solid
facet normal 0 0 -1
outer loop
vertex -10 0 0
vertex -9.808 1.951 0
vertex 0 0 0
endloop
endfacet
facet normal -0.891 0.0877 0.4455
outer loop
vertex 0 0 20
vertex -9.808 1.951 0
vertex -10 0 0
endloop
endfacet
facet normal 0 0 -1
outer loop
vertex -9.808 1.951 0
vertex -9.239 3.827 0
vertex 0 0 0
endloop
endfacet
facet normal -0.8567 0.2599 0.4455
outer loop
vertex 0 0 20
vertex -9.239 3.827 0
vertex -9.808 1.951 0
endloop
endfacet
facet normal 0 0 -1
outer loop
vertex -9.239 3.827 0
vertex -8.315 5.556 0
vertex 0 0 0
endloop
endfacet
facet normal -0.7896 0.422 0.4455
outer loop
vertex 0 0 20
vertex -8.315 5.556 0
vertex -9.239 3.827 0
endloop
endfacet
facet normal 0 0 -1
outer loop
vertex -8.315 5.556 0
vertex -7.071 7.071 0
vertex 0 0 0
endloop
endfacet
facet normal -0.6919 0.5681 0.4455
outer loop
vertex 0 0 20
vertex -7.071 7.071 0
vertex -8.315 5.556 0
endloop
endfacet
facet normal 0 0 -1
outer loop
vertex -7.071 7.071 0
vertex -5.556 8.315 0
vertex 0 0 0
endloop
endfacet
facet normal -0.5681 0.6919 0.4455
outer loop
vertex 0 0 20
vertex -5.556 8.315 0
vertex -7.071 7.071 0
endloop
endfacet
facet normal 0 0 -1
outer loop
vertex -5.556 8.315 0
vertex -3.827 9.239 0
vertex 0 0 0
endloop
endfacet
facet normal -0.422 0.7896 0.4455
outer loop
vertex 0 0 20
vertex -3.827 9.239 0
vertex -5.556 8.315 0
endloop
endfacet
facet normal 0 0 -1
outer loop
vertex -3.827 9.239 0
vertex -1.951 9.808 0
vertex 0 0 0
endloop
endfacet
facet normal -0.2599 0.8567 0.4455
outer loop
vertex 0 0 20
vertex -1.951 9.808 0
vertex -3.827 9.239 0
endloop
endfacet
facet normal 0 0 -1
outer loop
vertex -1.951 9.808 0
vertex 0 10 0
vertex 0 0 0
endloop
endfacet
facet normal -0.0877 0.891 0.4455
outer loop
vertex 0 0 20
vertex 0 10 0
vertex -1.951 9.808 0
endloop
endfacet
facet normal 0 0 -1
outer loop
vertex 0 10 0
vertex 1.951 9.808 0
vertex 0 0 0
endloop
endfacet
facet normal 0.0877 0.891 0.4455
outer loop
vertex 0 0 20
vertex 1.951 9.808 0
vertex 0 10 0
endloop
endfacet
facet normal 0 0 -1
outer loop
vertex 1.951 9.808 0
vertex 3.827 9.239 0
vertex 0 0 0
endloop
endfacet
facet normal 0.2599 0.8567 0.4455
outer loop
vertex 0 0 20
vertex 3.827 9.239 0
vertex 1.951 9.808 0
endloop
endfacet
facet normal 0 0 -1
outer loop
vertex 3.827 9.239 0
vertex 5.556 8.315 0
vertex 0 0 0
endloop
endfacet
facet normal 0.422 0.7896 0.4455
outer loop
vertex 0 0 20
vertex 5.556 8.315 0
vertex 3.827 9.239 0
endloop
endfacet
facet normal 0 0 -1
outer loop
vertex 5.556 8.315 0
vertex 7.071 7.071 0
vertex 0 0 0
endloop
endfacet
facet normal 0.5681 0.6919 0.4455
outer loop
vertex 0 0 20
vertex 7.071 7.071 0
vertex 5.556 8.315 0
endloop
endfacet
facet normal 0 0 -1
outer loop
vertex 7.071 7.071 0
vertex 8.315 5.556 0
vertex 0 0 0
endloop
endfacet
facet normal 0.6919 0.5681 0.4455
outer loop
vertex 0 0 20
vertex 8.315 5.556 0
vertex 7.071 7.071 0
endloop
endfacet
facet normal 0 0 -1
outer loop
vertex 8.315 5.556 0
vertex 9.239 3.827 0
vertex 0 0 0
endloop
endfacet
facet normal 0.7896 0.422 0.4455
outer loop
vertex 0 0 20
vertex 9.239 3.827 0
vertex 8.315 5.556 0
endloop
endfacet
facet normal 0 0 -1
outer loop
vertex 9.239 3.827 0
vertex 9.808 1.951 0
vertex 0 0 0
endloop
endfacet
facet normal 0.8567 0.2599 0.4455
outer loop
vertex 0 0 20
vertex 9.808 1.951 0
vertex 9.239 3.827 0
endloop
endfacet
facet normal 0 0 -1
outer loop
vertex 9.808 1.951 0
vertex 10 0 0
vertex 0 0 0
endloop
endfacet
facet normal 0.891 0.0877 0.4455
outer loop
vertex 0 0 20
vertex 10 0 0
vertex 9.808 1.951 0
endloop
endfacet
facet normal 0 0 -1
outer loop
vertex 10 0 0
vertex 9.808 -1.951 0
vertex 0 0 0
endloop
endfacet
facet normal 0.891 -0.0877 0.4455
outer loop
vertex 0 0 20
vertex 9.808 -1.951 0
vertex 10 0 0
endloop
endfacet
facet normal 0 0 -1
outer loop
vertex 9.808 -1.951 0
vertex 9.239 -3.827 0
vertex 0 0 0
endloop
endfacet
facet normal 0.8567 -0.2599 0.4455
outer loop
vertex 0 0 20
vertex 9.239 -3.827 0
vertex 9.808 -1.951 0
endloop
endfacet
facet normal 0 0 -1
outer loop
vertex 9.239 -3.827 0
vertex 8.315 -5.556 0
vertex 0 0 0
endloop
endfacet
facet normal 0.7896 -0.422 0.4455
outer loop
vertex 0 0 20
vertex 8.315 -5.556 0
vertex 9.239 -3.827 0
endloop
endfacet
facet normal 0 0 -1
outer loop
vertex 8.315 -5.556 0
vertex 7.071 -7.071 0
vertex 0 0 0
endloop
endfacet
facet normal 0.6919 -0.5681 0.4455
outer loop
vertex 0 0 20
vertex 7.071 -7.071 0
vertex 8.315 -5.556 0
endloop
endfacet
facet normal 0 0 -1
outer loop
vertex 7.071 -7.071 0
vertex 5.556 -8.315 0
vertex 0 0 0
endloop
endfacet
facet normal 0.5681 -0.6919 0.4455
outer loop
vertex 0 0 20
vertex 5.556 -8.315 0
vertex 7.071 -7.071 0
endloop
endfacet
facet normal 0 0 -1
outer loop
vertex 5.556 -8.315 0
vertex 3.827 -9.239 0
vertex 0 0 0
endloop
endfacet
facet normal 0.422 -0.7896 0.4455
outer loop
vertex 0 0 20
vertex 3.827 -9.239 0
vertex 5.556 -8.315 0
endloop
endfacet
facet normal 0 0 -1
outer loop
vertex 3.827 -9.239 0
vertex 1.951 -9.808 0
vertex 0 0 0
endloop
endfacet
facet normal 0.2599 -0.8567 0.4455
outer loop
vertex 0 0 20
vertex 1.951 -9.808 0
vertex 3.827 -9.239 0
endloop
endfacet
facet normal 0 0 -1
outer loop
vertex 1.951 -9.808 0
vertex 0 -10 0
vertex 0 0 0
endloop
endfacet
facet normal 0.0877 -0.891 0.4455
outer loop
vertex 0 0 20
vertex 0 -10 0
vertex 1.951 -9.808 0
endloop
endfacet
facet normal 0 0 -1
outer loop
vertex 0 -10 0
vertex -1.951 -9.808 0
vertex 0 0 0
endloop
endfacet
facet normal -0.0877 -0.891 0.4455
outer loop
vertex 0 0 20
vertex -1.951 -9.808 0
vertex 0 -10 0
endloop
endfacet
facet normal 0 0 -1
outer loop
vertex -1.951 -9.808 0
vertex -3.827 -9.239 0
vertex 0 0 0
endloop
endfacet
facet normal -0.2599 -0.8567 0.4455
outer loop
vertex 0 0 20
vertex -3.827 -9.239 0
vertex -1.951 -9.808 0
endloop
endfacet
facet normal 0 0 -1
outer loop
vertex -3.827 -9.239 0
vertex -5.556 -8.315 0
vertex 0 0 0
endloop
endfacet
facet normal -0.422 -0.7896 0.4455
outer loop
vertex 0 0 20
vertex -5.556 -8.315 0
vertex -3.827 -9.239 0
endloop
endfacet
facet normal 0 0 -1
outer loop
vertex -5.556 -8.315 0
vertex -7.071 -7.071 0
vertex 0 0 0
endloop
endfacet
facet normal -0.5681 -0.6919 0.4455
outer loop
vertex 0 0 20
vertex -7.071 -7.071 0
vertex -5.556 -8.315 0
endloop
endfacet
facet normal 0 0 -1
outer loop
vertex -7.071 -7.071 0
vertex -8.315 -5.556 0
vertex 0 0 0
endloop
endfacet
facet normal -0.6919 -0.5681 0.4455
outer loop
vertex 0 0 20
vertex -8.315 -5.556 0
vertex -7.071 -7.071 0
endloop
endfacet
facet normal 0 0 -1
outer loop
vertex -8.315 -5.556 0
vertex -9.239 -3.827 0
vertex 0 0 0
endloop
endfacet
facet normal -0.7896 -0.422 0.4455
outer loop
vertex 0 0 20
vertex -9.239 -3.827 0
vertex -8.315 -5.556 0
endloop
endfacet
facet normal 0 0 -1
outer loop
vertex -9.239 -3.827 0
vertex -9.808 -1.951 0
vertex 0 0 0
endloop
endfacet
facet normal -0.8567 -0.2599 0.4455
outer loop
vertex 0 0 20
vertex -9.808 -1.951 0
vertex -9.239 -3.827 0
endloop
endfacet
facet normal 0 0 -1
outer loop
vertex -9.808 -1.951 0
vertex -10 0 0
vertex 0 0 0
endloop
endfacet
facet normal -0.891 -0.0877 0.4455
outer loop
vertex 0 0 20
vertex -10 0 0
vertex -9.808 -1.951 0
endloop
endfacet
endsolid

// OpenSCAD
// A profile with a point on the axis, which is where rotate_extrude used to
// leave degenerate facets behind.
//
// Every revolved profile point becomes one vertex per angular step. A point on
// the axis is the exception: all of its copies are the same point in space, and
// emitting them separately gives each ring of the fan a triangle with two
// coincident corners - zero area, no normal, and a shell that is closed only in
// the sense that its holes are infinitely thin. Nothing downstream can fit a
// surface through that, so a turned cone would export as one plane per facet
// plus the slivers between them. The generator welds them instead.
//
// The regression this guards is not subtle once it is measured: on a profile
// like a wine glass's the same defect took the export from 42 faces to 2616.
//
// And since 2026-09-25 the cone is declared. A segment reaching the axis sweeps
// a cone whose apex is on it - a wall like any other - and rotate_extrude
// refused it, first because the fan left the shell open and then because
// nobody took the refusal out once the weld had closed it (doc/step-export-wip.md,
// *Inferred where a declaration was possible*, item 4). The sweep table declares
// it now as it declares every sloped edge's cone: a face, anchored at its one
// rim, r = 10 at z = 0. Only the cone - the rims a sloped edge offers as
// evidence name a cone by its two circles, and this one has a point for the
// second.
// EXPECT: 1 analytic surface available (0 cylindrical, 0 spherical, 0 toroidal, 0 Bezier, 1 conical)
//
// One plane, and it is the model's: of the profile triangle's three edges, the
// one from [0,0] to [10,0] lies at a single height and sweeps a flat disc, the
// one from [0,20] back to [0,0] is the axis itself and sweeps nothing, and the
// sloped one is the cone this fixture is about. A full turn has no end caps. So
// exactly one plane is declared, and the disc is the face written on it.
// EXPECT: and 1 declared plane
// EXPECT: 1 planar face written on a plane the model declared
//
// Thirty-two facets of wall, every one on the cone its maker declared with all
// three corners on it - the apex included, which the weld made one vertex - so
// every one decided by the model. A degenerate facet at the apex would be a
// thirty-third, or a wall facet left to the tessellation.
// EXPECT: what decided each written facet: 32 D0, 0 D1, 0 D2, 0 D3, 0 D4
//
// The kernel reads the cone and the disc, and nothing else: one face for the
// cone, bounded by its base circle alone. It wraps the axis, and the quadric
// pass cuts a wrapping region in two - which here would put an edge the model
// does not have between two faces of one surface, since a region containing
// the apex is a disc and needs no cut. It does need a seam: the surface is
// periodic round the axis, so a face covering the whole turn is bounded in its
// own parameters only by a loop that also runs up a generator to the apex and
// back. Without it OCCT read the file anyway, by inventing the seam - which is
// the reader's repair, not the file being right (worst tolerance 1e-5 then, 0
// with it).
// EXPECT: 1 cone face closed round its apex by a seam up a generator
// ROUNDTRIP: Cone=1 Plane=1
//
// Not yet right, and recorded rather than asserted: the base circle is written
// as 32 arcs, one per facet it bounded - 32 vertices on a circle the model has
// none on. A band writes its rim as one CIRCLE; this face comes through the
// quadric pass, which writes a boundary segment by segment.
//
// Derived, and exactly: the analytic export is the cone itself, (1/3) pi r^2 h
// = pi * 100 * 20 / 3. Until the cone was declared this line stated the mesh -
// a pyramid on a regular 32-gon, 2080.9634348 - because the export was the mesh.
// VOLUME: 2094.3951024
$fn = 32;
rotate_extrude() polygon([[0, 0], [10, 0], [0, 20]]);
